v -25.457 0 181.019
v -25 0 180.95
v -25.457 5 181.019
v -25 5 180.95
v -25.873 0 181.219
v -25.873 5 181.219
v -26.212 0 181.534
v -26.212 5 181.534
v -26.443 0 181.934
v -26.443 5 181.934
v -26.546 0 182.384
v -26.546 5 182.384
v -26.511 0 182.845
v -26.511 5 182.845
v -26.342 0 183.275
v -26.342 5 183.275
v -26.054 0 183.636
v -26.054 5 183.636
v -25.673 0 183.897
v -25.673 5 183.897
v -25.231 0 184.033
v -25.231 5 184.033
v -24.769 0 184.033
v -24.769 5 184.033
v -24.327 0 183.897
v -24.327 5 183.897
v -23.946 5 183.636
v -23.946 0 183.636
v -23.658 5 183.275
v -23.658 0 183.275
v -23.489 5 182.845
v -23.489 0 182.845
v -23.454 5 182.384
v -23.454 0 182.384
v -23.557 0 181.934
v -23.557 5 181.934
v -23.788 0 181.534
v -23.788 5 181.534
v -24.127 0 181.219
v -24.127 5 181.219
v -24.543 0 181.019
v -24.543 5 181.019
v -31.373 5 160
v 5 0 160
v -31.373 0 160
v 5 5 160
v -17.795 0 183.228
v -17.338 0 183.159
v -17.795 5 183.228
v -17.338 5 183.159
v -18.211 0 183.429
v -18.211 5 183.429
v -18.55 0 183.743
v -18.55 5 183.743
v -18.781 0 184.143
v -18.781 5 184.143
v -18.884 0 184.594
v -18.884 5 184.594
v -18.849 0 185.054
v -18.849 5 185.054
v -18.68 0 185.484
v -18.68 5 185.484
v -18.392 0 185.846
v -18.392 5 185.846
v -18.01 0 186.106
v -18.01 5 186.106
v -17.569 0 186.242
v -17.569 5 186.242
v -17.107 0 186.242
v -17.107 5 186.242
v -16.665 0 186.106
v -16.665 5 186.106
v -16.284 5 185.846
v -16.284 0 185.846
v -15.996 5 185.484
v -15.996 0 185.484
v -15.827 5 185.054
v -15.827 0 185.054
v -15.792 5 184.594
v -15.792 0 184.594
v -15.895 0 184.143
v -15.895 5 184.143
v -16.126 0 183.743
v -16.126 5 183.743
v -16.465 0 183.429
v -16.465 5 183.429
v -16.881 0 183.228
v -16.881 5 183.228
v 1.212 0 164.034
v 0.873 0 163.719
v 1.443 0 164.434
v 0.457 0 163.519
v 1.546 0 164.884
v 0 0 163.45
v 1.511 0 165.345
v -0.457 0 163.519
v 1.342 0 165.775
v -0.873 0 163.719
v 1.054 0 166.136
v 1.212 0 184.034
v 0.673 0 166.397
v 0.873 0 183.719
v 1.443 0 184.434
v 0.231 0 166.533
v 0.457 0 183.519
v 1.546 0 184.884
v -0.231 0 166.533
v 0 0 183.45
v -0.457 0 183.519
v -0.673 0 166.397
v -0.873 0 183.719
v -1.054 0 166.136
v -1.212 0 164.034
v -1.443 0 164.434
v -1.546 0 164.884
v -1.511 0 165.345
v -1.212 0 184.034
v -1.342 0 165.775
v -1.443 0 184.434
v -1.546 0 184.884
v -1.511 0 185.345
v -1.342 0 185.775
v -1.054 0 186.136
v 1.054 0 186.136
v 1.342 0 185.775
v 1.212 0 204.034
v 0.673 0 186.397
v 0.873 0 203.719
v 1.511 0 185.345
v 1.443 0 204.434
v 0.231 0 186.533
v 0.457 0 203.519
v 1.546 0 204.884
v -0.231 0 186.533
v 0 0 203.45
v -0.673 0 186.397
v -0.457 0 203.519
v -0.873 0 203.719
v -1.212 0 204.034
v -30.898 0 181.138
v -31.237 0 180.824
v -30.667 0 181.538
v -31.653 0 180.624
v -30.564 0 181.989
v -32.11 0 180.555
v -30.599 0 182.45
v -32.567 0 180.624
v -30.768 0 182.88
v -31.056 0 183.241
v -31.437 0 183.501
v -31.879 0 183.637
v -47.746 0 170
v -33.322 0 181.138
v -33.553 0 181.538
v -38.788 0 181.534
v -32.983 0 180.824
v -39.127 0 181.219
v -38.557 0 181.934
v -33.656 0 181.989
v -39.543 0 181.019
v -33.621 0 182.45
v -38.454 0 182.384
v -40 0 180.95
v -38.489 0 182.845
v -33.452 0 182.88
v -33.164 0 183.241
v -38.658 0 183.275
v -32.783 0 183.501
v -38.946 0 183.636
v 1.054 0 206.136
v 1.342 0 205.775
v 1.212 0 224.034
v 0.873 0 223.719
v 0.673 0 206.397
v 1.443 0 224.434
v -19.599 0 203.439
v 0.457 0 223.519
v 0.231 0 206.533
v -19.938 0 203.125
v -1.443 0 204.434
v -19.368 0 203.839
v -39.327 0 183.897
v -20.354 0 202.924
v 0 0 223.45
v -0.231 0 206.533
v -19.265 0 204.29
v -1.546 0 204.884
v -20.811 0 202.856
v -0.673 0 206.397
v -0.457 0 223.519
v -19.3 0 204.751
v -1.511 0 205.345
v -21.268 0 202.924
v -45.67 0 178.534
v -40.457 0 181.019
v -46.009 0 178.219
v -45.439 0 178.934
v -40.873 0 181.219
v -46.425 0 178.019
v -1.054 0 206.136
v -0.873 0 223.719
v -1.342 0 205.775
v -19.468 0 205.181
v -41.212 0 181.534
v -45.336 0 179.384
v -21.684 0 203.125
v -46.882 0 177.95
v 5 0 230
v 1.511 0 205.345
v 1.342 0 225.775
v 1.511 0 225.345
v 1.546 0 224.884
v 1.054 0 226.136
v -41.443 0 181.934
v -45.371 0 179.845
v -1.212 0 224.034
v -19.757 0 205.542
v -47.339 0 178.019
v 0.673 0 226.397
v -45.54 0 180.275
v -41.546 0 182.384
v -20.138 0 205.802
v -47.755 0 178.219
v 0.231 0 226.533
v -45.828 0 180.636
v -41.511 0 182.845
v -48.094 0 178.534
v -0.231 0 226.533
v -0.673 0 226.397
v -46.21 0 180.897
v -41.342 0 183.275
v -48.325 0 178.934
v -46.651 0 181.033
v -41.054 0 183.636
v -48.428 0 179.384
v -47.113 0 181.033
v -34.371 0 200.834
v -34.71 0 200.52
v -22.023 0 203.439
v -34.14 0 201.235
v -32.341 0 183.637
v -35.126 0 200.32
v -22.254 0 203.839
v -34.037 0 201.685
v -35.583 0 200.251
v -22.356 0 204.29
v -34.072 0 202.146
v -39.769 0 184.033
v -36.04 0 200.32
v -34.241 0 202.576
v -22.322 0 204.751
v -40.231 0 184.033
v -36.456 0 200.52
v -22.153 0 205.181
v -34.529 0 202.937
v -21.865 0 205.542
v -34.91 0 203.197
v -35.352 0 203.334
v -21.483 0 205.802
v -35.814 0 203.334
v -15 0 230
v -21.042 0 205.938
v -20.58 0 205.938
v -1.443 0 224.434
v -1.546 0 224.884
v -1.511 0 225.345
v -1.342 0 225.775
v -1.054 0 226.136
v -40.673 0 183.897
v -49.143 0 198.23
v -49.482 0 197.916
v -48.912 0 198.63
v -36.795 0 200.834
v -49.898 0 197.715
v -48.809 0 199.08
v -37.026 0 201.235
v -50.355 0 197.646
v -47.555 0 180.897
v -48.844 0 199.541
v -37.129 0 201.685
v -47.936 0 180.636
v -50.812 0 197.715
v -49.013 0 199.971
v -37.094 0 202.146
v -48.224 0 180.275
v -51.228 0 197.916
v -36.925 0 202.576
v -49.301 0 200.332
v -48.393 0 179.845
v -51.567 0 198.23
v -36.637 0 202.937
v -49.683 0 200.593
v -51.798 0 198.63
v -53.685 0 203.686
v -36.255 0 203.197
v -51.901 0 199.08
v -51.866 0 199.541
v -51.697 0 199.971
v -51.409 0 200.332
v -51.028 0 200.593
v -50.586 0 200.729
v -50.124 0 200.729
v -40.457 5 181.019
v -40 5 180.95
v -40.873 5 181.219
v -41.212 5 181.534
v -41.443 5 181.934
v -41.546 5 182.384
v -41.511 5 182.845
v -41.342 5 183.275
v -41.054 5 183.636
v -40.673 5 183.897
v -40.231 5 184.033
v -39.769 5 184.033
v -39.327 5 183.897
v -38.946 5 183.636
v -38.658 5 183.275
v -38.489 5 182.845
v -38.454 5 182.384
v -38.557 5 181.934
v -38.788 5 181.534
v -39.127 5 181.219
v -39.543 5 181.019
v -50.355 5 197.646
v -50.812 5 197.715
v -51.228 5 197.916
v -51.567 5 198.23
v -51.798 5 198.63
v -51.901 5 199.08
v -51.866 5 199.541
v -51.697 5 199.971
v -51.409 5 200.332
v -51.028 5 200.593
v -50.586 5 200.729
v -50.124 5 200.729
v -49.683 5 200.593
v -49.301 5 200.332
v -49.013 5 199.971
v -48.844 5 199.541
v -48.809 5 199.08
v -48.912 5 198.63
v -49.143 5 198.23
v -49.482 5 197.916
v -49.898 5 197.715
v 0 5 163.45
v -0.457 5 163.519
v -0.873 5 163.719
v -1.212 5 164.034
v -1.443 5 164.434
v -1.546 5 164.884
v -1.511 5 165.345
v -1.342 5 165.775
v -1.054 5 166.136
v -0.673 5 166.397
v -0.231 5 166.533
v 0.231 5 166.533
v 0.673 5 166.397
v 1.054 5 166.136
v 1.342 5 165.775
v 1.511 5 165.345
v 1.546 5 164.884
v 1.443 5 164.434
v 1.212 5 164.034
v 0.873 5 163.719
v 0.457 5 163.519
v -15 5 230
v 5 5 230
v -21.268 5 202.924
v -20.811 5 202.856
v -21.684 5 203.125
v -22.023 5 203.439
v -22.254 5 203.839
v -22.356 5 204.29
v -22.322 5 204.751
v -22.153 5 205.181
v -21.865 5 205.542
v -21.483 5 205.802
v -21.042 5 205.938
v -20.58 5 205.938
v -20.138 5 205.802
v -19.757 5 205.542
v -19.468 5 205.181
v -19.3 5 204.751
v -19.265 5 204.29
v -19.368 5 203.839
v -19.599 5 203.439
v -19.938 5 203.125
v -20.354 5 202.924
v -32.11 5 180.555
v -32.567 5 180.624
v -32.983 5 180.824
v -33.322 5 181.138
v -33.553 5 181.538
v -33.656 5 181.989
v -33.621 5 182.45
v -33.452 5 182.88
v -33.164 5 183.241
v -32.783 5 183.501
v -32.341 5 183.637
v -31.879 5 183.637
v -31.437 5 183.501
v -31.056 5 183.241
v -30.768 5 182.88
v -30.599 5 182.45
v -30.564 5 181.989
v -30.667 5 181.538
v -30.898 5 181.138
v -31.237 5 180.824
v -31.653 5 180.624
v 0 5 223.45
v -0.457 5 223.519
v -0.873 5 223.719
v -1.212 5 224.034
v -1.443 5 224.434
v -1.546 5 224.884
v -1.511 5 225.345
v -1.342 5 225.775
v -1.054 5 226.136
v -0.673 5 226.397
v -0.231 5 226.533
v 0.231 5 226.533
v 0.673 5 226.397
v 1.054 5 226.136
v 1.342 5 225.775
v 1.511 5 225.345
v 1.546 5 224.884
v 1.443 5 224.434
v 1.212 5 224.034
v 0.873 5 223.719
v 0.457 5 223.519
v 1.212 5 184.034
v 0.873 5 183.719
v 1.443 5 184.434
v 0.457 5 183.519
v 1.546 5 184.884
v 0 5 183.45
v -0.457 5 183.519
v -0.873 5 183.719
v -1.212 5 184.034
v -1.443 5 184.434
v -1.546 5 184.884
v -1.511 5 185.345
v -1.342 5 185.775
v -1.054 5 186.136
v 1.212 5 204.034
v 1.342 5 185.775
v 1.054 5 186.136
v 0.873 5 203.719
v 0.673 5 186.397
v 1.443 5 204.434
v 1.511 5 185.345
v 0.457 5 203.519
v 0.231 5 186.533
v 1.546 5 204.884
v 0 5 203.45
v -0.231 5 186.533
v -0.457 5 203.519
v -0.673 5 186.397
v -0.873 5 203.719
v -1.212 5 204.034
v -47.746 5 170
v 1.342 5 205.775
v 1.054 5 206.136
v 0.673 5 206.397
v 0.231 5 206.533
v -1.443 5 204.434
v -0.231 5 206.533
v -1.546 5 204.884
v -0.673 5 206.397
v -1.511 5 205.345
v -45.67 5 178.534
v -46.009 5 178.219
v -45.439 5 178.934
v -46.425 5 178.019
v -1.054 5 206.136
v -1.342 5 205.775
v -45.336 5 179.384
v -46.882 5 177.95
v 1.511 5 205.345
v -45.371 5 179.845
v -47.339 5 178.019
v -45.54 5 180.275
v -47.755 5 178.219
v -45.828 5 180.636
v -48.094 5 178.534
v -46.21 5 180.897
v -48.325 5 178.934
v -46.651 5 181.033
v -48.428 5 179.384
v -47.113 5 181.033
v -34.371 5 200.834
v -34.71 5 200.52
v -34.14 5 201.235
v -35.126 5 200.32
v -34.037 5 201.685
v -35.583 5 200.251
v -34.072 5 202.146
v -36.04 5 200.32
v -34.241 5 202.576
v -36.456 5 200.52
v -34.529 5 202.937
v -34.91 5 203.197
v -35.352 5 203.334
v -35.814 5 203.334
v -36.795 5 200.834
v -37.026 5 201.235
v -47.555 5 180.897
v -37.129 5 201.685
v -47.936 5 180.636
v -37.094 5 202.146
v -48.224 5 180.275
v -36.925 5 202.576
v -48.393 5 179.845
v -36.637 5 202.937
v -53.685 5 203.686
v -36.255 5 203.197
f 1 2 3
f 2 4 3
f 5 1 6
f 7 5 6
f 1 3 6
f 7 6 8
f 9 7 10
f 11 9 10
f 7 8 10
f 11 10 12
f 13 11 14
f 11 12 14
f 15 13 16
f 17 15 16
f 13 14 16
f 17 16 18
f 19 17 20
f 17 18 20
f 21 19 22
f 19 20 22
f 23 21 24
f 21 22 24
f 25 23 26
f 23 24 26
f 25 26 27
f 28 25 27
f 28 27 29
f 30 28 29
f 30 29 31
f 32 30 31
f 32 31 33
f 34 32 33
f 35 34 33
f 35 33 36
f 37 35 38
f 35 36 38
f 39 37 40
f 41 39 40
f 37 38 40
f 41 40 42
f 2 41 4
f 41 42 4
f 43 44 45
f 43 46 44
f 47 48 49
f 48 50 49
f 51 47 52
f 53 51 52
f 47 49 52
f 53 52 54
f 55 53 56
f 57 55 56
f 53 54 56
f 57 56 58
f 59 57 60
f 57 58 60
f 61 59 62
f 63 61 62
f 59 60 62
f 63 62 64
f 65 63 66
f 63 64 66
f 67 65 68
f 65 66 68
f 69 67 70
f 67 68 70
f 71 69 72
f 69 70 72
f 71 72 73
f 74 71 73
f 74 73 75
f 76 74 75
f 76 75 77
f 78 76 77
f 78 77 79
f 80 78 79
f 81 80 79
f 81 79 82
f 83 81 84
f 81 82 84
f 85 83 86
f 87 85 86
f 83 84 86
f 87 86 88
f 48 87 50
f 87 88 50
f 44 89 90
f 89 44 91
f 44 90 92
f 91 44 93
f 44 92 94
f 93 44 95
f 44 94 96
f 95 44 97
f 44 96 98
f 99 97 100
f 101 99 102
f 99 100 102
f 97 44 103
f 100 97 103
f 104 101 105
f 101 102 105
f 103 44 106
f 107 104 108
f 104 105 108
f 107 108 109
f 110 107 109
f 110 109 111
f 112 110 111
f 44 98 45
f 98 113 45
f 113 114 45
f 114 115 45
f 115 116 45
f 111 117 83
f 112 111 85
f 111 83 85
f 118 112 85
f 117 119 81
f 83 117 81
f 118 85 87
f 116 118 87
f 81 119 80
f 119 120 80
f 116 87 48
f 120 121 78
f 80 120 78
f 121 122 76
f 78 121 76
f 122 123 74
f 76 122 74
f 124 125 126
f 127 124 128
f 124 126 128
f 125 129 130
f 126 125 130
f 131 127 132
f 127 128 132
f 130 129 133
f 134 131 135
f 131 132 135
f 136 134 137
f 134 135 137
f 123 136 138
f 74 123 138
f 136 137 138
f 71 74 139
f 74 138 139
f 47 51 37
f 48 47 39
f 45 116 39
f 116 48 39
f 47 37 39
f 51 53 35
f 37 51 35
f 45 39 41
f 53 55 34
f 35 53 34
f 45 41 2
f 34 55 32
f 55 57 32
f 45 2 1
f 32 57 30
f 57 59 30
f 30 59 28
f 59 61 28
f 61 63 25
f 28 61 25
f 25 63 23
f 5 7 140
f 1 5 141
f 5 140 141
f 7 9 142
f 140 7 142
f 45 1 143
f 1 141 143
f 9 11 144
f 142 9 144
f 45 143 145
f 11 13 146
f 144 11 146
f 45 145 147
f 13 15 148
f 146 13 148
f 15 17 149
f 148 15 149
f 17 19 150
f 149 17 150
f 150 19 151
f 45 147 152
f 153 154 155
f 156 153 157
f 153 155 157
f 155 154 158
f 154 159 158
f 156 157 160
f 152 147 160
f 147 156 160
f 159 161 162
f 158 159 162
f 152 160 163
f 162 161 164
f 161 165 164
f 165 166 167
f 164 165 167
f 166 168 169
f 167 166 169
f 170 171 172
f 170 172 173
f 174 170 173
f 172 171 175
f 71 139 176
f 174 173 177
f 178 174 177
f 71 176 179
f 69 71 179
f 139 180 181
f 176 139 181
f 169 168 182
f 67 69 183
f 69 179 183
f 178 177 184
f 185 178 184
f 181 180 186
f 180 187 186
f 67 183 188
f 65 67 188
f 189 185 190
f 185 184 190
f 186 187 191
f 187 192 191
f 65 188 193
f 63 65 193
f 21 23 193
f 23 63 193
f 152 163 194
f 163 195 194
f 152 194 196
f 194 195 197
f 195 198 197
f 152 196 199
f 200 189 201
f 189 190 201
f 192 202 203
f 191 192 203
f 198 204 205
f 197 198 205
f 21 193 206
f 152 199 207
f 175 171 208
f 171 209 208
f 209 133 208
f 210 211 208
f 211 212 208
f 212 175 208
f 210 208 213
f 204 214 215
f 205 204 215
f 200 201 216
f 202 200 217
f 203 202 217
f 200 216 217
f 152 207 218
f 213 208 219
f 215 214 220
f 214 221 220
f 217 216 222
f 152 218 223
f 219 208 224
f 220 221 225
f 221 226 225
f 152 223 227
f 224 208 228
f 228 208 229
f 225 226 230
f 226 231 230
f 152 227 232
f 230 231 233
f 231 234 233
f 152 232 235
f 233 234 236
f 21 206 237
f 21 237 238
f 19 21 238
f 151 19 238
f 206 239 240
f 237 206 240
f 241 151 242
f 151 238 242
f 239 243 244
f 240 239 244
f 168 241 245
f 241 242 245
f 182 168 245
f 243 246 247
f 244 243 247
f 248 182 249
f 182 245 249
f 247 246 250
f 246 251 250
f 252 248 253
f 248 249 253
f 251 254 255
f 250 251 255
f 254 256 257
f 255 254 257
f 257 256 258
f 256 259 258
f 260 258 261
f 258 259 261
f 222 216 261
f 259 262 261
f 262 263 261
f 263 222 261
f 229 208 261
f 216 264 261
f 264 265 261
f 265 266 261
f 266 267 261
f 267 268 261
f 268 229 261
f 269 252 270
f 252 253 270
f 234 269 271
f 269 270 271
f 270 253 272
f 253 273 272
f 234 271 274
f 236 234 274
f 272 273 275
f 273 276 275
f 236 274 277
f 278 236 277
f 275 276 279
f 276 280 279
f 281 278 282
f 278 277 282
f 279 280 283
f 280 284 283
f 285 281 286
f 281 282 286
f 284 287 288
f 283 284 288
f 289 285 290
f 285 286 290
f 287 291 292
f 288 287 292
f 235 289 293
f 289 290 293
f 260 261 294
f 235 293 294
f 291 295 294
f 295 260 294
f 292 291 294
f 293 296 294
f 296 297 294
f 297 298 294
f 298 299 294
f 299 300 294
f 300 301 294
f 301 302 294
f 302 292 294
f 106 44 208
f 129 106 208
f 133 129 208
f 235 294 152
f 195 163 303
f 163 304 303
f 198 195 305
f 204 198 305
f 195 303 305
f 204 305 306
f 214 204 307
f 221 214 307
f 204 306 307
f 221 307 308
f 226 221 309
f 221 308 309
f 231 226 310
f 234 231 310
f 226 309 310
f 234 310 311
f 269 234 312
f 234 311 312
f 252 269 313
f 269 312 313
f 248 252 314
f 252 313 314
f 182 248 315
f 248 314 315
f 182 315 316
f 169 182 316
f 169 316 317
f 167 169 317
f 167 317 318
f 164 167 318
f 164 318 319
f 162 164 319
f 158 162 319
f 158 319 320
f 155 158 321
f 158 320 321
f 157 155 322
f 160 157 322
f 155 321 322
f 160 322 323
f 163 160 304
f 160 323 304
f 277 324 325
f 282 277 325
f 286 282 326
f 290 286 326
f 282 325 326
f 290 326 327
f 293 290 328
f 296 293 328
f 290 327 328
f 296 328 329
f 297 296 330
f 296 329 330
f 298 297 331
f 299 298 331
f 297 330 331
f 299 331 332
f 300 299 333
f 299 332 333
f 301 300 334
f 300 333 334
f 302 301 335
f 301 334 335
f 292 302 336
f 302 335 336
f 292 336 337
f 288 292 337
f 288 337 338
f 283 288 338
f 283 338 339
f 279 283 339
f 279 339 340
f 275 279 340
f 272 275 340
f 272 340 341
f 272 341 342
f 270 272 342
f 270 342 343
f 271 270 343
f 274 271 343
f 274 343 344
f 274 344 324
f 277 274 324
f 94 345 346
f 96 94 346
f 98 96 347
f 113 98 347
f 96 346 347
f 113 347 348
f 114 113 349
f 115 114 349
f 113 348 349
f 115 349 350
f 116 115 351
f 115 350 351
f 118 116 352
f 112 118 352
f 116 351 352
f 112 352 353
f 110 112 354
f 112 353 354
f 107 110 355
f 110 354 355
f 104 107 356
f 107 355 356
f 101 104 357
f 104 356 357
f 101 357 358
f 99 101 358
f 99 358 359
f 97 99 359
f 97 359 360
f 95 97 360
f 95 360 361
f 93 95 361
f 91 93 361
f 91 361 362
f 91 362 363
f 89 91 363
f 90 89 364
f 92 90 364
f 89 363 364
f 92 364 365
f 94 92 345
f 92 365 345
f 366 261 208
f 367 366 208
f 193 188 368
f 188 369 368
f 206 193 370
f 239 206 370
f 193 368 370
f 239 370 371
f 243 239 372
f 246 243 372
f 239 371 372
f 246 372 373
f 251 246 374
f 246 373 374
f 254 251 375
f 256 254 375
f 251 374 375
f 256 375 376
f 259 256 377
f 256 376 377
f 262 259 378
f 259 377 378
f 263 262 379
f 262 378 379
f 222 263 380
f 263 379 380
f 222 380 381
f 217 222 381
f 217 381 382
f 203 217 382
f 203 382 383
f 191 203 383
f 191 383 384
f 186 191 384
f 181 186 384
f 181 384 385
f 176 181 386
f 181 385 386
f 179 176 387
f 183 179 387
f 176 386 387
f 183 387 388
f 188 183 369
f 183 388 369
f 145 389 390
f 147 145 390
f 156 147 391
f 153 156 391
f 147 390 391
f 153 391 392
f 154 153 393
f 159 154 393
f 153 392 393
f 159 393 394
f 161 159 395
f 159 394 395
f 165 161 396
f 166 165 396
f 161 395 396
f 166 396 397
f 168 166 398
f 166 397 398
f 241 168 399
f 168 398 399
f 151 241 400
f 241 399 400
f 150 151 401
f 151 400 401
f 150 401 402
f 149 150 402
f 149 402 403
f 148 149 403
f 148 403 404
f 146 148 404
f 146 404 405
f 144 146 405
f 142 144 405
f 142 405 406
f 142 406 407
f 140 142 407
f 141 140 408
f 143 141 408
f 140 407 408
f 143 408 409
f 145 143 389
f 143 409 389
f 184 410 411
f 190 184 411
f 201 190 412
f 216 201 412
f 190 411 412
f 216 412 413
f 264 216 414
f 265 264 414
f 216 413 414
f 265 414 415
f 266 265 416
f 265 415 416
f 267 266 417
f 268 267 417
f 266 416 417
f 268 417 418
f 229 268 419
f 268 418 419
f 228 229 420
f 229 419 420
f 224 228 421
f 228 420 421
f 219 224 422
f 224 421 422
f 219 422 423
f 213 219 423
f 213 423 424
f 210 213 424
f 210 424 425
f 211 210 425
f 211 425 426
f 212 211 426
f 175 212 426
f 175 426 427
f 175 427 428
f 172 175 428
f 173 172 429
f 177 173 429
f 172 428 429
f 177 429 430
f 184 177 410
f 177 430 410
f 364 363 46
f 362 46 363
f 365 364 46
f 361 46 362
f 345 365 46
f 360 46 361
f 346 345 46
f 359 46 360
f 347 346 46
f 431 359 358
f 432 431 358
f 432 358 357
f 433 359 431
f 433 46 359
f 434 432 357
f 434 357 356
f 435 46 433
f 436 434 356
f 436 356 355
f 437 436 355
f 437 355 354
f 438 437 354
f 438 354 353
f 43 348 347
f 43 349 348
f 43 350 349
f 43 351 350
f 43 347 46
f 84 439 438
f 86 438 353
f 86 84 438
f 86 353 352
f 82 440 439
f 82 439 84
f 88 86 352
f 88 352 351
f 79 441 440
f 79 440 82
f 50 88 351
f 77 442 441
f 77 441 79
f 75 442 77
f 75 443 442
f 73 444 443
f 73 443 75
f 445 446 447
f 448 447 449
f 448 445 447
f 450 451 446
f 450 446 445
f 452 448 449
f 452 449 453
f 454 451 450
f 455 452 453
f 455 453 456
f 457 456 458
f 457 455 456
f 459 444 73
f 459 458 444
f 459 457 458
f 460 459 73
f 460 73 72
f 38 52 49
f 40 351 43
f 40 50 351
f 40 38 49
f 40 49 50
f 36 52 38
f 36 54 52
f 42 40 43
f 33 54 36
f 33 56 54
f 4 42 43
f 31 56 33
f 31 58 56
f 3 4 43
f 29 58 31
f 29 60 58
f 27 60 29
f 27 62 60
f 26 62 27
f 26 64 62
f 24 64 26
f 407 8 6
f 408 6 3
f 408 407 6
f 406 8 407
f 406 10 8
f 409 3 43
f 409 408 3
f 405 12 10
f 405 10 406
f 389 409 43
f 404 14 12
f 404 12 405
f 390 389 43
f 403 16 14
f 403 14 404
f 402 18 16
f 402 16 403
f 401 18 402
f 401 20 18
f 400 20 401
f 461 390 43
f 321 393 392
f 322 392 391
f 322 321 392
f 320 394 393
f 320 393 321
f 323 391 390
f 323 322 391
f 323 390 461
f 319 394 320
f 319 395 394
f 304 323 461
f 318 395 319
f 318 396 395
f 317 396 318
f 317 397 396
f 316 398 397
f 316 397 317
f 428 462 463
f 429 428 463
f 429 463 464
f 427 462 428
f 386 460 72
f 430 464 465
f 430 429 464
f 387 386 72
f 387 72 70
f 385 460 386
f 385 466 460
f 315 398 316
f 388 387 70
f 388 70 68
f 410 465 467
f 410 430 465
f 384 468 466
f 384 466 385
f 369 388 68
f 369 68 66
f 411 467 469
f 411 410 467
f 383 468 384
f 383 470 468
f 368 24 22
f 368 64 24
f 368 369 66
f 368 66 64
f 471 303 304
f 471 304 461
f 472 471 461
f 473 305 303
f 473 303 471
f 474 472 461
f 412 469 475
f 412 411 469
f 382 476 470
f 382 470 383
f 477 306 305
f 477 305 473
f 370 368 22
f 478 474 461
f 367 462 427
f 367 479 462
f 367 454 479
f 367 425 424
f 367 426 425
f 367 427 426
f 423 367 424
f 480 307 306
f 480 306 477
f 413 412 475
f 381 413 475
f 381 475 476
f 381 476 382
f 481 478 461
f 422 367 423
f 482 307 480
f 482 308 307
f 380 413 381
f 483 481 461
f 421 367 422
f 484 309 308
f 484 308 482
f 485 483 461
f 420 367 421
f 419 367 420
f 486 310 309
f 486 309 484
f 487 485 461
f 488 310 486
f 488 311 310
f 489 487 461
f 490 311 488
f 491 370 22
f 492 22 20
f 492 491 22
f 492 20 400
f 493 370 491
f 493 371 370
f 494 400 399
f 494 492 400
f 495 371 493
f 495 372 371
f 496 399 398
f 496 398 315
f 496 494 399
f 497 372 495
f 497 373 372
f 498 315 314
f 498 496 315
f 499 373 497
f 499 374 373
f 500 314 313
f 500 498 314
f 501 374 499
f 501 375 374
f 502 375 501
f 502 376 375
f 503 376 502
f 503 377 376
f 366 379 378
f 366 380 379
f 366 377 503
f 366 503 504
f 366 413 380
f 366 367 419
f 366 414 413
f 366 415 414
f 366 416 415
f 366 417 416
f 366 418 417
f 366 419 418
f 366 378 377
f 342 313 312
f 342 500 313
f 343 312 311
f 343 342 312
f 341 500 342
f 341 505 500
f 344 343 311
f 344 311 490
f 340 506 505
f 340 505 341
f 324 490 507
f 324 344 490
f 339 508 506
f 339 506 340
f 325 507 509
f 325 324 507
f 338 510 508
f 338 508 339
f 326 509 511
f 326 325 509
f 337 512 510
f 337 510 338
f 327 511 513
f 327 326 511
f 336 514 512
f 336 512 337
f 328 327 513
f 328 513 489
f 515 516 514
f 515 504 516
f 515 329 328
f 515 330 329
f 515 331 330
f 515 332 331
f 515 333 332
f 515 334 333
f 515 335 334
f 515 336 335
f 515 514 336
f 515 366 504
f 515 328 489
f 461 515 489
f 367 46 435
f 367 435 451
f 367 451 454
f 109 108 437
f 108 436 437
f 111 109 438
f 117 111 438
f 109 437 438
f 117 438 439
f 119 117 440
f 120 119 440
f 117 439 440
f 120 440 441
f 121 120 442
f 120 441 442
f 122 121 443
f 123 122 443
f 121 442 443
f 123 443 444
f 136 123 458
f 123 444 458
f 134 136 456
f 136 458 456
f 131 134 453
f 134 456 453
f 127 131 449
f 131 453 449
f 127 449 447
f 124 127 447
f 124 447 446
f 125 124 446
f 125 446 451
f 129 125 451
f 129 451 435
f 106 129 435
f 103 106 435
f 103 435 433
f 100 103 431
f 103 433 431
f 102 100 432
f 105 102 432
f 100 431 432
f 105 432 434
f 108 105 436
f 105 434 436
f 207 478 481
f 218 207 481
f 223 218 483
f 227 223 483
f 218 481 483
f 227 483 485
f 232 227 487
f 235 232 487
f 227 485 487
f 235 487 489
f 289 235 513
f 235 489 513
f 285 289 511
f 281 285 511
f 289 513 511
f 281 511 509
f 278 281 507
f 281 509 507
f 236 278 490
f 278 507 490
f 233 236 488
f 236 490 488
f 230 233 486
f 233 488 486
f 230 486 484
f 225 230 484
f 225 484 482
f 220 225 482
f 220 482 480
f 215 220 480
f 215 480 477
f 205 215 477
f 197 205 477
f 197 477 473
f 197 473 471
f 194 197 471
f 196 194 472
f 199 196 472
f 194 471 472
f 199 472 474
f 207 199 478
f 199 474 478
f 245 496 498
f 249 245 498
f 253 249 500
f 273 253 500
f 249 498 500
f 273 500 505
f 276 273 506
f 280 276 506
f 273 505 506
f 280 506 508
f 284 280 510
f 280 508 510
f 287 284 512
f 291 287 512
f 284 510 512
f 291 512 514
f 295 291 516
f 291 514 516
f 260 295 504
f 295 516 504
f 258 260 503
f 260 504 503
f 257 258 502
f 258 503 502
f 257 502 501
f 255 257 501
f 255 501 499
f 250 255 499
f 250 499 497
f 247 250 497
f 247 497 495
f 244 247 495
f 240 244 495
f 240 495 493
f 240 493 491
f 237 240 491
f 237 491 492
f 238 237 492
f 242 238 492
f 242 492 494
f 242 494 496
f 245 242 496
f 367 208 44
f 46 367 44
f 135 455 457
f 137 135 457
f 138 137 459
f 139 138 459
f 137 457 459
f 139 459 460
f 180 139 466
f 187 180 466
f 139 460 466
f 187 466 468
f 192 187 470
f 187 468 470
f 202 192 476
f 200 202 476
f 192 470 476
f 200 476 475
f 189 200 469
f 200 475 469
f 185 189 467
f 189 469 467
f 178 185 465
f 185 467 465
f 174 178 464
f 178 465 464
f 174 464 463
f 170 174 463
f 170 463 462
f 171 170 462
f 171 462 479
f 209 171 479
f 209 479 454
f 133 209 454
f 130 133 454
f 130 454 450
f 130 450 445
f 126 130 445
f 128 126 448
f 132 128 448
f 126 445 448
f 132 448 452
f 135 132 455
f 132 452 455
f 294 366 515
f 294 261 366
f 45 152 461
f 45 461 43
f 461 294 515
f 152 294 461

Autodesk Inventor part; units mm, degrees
ref_plane "YZ Plane" through (0, 0, 0) normal (1, 0, 0) x (0, 1, 0)
ref_plane "XZ Plane" through (0, 0, 0) normal (0, 1, 0) x (-1, 0, 0)
ref_plane "XY Plane" through (0, 0, 0) normal (0, 0, 1) x (1, 0, 0)
sketch "スケッチ1" plane through (0, 0, 0) normal (0, 1, 0) x (-1, 0, 0)
  circle A0 centre (0, 0) radius 122.5
  line L0 (0, 0) -> (21.2719, 120.6389)
  line L1 (21.2719, 120.6389) -> (-21.2719, -120.6389)
  line L2 (21.2719, 120.6389) -> (-41.166, -233.4643)
  arc A1 (21.2719, 120.6389) -> (0, 122.5) centre (0, 0) ccw
  arc A2 (-21.2719, -120.6389) -> (0, -122.5) centre (0, 0) ccw
  arc A3 (-41.8975, -115.1123) -> (-21.2719, -120.6389) centre (0, 0) ccw
  circle A4 centre (0, 0) radius 125
  circle A5 centre (0, 0) radius 145
  arc A6 (-42.7525, -117.4616) -> (-105.9051, -66.4011) centre (0, 0) ccw
  line L3 (0, 0) -> (-42.7525, -117.4616) construction
  line L4 (21.706, 123.101) -> (21.706, 123.101)
  line L5 (0, -145) -> (0, -265.735)
  line L6 (0, 0) -> (-41.8975, -115.1123)
  line L7 (-49.5929, -136.2554) -> (-41.8975, -115.1123)
  line L8 (-42.7525, -117.4616) -> (-231.4975, -48.764)
  line L9 (42.7525, 117.4616) -> (0, 0)
  line L10 (0, -145) -> (0, 145)
  line L11 (0, 0) -> (0, 300)
  circle A7 centre (0, 300) radius 20
  line L12 (117.0937, 43.75) -> (18.735, 307)
  line L13 (0, 0) -> (185.4327, 0)
  line L14 (0, 0) -> (-259.4726, 94.4403)
  line L15 (42.7525, 117.4616) -> (-253.7236, 225.3701)
  line L16 (0, 125) -> (22.0409, 125)
  line L17 (21.2719, 120.6389) -> (25.179, 142.7971)
  line L18 (42.7525, 117.4616) -> (65.8461, 180.9106)
  line L19 (15, 170) -> (69.9226, 170)
  line L20 (15.9946, 175) -> (68.0545, 175)
  line L21 (0, 125) -> (-15, 125)
  line L22 (-15, 125) -> (-15, 325)
  line L23 (-15, 325) -> (0, 325)
  line L24 (0, 325) -> (0, 125)
  line L25 (0, 125) -> (15, 125)
  line L26 (15, 125) -> (15, 325)
  line L27 (15, 325) -> (0, 325)
  line L28 (0, 325) -> (0, 125)
  line L29 (15, 200) -> (15, 325)
  line L30 (15, 325) -> (-15, 325)
  line L31 (-15, 325) -> (-15, 150)
  line L32 (15, 170) -> (37.5, 170)
  line L33 (37.5, 170) -> (17.5, 170)
  line L34 (0, 0) -> (0, 300)
  line L35 (0, -125) -> (42.7525, 117.4616)
  line L36 (-42.7525, -117.4616) -> (0, 125)
  line L37 (0, -125) -> (-3.519, -144.9573)
  line L38 (42.7525, 117.4616) -> (49.5929, 136.2554)
  line L39 (0, 125) -> (3.519, 144.9573)
  line L40 (-42.7525, -117.4616) -> (-46.2715, -137.4189)
  line L41 (42.7525, 117.4616) -> (46.2715, 137.4189)
  line L42 (-3.519, -144.9573) -> (46.2715, 137.4189)
  line L43 (46.2715, 137.4189) -> (37.2054, 139.0175)
  line L44 (-12.5852, -143.3587) -> (-3.519, -144.9573)
  line L45 (-46.2715, -137.4189) -> (3.519, 144.9573)
  line L46 (3.519, 144.9573) -> (12.5852, 143.3587)
  line L47 (-37.2054, -139.0175) -> (-46.2715, -137.4189)
  line L48 (-27.6373, -142.3418) -> (-22.7132, -143.21)
  line L49 (-27.6373, -142.3418) -> (-22.7132, -143.21)
  line L50 (-22.7132, -143.21) -> (27.641, 142.363)
  line L51 (27.641, 142.363) -> (22.717, 143.2312)
  line L52 (22.717, 143.2312) -> (-27.6373, -142.3418)
  line L53 (12.5852, 143.3587) -> (-37.2054, -139.0175)
  line L54 (-12.5852, -143.3587) -> (37.2054, 139.0175)
  line L55 (-42.1294, -138.1492) -> (7.6611, 144.2269)
  line L56 (-7.6611, -144.2269) -> (42.1294, 138.1492)
  line L57 (12.5852, 143.3587) -> (7.6611, 144.2269)
  line L58 (7.6611, 144.2269) -> (29.236, 266.5842)
  line L59 (29.236, 266.5842) -> (34.1601, 265.7159)
  line L60 (34.1601, 265.7159) -> (12.5852, 143.3587)
  line L61 (22.717, 143.2312) -> (25.179, 142.7971)
  line L62 (25.179, 142.7971) -> (42.462, 240.8141)
  line L63 (42.462, 240.8141) -> (40, 241.2482)
  line L64 (40, 241.2482) -> (22.717, 143.2312)
  line L65 (42.1294, 138.1492) -> (37.2054, 139.0175)
  line L66 (37.2054, 139.0175) -> (49.9319, 211.1932)
  line L67 (49.9319, 211.1932) -> (54.8559, 210.3249)
  line L68 (54.8559, 210.3249) -> (42.1294, 138.1492)
  line L69 (25.179, 142.7971) -> (27.641, 142.363)
  line L70 (27.641, 142.363) -> (44.508, 238.0204)
  line L71 (44.508, 238.0204) -> (42.046, 238.4546)
  line L72 (42.046, 238.4546) -> (25.179, 142.7971)
  line L73 (15.9946, 175) -> (15, 175)
  line L74 (15, 175) -> (0, 175)
  line L75 (0, 175) -> (0, 170)
  line L76 (0, 170) -> (15, 170)
  line L77 (15, 170) -> (15, 175)
  line L78 (20, 175) -> (40, 175)
  line L79 (40, 175) -> (40, 245)
  line L80 (40, 245) -> (20, 245)
  line L81 (20, 245) -> (20, 175)
  line L82 (30, 175) -> (30, 118.7697)
  line L83 (0, 175) -> (58.7137, 175)
  line L84 (58.7137, 175) -> (58.7137, 200)
  line L85 (58.7137, 200) -> (0, 200)
  line L86 (0, 200) -> (0, 175)
  line L87 (0, 200) -> (50, 200)
  line L88 (50, 200) -> (50, 170)
  line L89 (50, 170) -> (0, 170)
  line L90 (0, 170) -> (0, 200)
  line L91 (50, 170) -> (0, 170)
  line L92 (0, 170) -> (0, 165)
  line L93 (0, 200) -> (-15, 200)
  line L94 (-15, 200) -> (-15, 180)
  line L95 (-15, 180) -> (0, 180)
  line L96 (0, 180) -> (0, 200)
  line L97 (0, 180) -> (-15, 180)
  line L98 (-15, 180) -> (-15, 175)
  line L99 (-15, 175) -> (0, 175)
  line L100 (0, 175) -> (0, 180)
  line L101 (0, 145) -> (-15, 145)
  line L102 (-15, 145) -> (-20.5, 145)
  line L103 (-20.5, 145) -> (-20.5, 200)
  line L104 (-20.5, 200) -> (-15, 200)
  line L105 (-15, 200) -> (-15, 145)
  line L106 (-20.5, 150) -> (-25, 150)
  line L107 (-25, 150) -> (-25, 180)
  line L108 (-25, 180) -> (-20.5, 180)
  line L109 (-20.5, 180) -> (-20.5, 150)
  line L110 (50, 175) -> (-15, 175)
  line L111 (-15, 175) -> (-15, 170)
  line L112 (50, 170) -> (50, 175)
  line L113 (-20.5, 165) -> (-25, 165)
  line L114 (-25, 165) -> (-25, 195)
  line L115 (-25, 195) -> (-20.5, 195)
  line L116 (-20.5, 195) -> (-20.5, 165)
  line L117 (15, 230) -> (-15, 230)
  line L118 (-15, 145) -> (15, 145)
  line L119 (31.698, 266.1501) -> (-39.6674, -138.5834)
  line L120 (52.3939, 210.7591) -> (-10.1232, -143.7928)
  line L121 (49.3441, 179.0659) -> (14.8758, 185.1436)
  line L122 (-15, 138.4818) -> (-15, 121.5782)
  line L123 (-7.6611, -144.2269) -> (-42.1294, -138.1492)
  line L124 (-39.6243, -123.9424) -> (-5.1561, -130.02)
  line L125 (-42.2291, -138.7145) -> (-7.7608, -144.7922)
  line L126 (-41.3608, -133.7904) -> (-6.8926, -139.8681)
  line L127 (-6.0243, -134.9441) -> (-40.4926, -128.8664)
  line L128 (18.3488, 204.8397) -> (52.8171, 198.762)
  line L129 (50.2124, 183.9899) -> (45.0029, 154.4457)
  line L130 (10.5346, 160.5234) -> (15.7441, 190.0676)
  line L131 (19.217, 209.7638) -> (53.6853, 203.6861)
  line L132 (15, 230) -> (53.6853, 203.6861)
  line L133 (53.6853, 203.6861) -> (53.6853, 170)
  line L134 (53.6853, 170) -> (-15, 170)
  line L135 (-15, 172.5) -> (53.6853, 172.5)
  line L136 (15, 170) -> (15, 150)
  line L137 (15, 150) -> (-15, 150)
  line L138 (-15, 170) -> (15, 170)
  line L139 (15, 150) -> (-15, 150)
  line L140 (-15, 150) -> (-15, 325)
  line L141 (-15, 325) -> (15, 325)
  line L142 (15, 325) -> (15, 150)
  circle A8 centre (0, 300) radius 6
  circle A9 centre (0, 300) radius 11
  line L143 (47.7456, 170) -> (15, 150)
  point P0 (-25.1752, -142.7759)
  point P1 (42.3116, 114.9608)
  point P2 (0, 133.0222)
  point P3 (-38.8988, -134.2246)
  point P4 (-38.0306, -129.3005)
  point P5 (-23.2585, -131.9052)
  point P6 (-24.1267, -136.8293)
  point P7 (-9.3546, -139.434)
  point P8 (-8.4863, -134.51)
  point P9 (17.3379, 184.7094)
  point P10 (32.11, 182.1047)
  point P11 (46.8821, 179.5)
  point P12 (50.3551, 199.1962)
  point P13 (35.5829, 201.8009)
  point P14 (20.8108, 204.4056)
  point P15 (0, 225)
  point P16 (0, 190)
  point P17 (0, 289)
  point P18 (0, 311)
  point P19 (37.5, 172.5)
  point P20 (22.5, 172.5)
  point P21 (47.7456, 170)
  point P22 (-15, 230)
  point P23 (20, 185.4103)
  point P24 (20, 184.24)
  point P25 (19.7999, 184.2753)
  point P26 (30, 170.1385)
  point P27 (30, 170)
  point P28 (29.9756, 170)
  point P29 (15, 185.8477)
  point P30 (15, 185.1217)
  dimension "d0" = 245
  dimension "d7" = 290
  dimension "d19" = 40
  dimension "d1" = 0
  dimension "d6" = 250
  dimension "d10" = 0
  dimension "d12" = 0
  dimension "d13" = 10
  dimension "d15" = 0
  dimension "d16" = 9.8877
  dimension "d18" = 10
  dimension "d21" = 145
  dimension "d23" = 175
  dimension "d26" = 7.5384
  dimension "d30" = 180
  dimension "d34" = 180
  dimension "d35" = 45
  dimension "d37" = 5
  dimension "d38" = 15
  dimension "d39" = 200
  dimension "d40" = 15
  dimension "d41" = 200
  dimension "d47" = 300
  dimension "d52" = 5
  dimension "d53" = 0
  dimension "d54" = 10
  dimension "d55" = 10
  dimension "d56" = 5
  dimension "d57" = 5
  dimension "d60" = 5
  dimension "d61" = 20
  dimension "d62" = 70
  dimension "d63" = 5
  dimension "d65" = 25
  dimension "d66" = 50
  dimension "d68" = 20
  dimension "d69" = 5
  dimension "d74" = 20
  dimension "d75" = 5.5
  dimension "d76" = 55
  dimension "d77" = 4.5
  dimension "d78" = 30
  dimension "d79" = 5
  dimension "d82" = 15
  dimension "d83" = 30
  dimension "d89" = 10.5222
  dimension "d92" = 15
  dimension "d93" = 5
  dimension "d94" = 5
  dimension "d96" = 4.5
  dimension "d97" = 5
  dimension "d98" = 30
  dimension "d99" = 5
  dimension "d101" = 20
  dimension "d102" = 10
  dimension "d103" = 20
  dimension "d104" = 12
  dimension "d105" = 22
  dimension "d106" = 7.5
  dimension "d107" = 15
  dimension "d108" = 30
extrude "押し出し1" add sketch "スケッチ1" along normal blind 5 contours L143 L66 L19 L120 | L120 L19 L143 | L19 L120 L135 L68 | L143 L70 L19 L66 | L19 L66 L135 L120 | L135 L120 L20 L68 | L19 L70 L135 L66 | L143 L82 L19 L70 | L135 L66 L20 L120 | L20 L120 L121 L68 | L143 L62 L19 L82 | L68 L85 L120 L131 | L131 L120 L132 | L68 L128 L120 L85 | L88 L120 L128 L68 | L68 L121 L120 L88 | L135 L70 L20 L66 | L19 L82 L62 L135 L70 | L20 L66 L121 L120 | L143 L64 L19 L62 | L19 L62 L82 | L132 L66 L131 L79 L70 | L70 L79 L132 | L120 L131 L66 L132 | L120 L85 L66 L131 | L120 L128 L88 L85 | L120 L121 L66 L128 L88 | L88 L128 L120 | L20 L79 L121 L66 | L135 L62 L20 L70 | L143 L26 L60 L19 L64 | L19 L64 L135 L82 L62 | L82 L135 L62 | L79 L131 L70 | L70 L131 L62 L132 L79 | L66 L85 L128 L79 L131 | L88 L128 L66 L85 | L20 L70 L121 L79 | L121 L79 L85 L128 L66 | L20 L62 L121 L70 | L135 L82 L20 L62 | L19 L60 L135 L64 | L137 L60 L26 | L135 L64 L20 L82 | L132 L64 L131 L60 | L60 L131 L119 L132 | L131 L79 L128 L70 | L70 L128 L62 L131 | L62 L131 L64 L132 | L66 L128 L85 | L121 L70 L85 L79 | L20 L64 L121 L62 | L121 L62 L85 L70 | L135 L60 L20 L64 | L60 L137 L119 L76 L26 | L26 L19 L60 | L119 L131 L81 L58 L132 | L131 L64 L128 L60 | L60 L128 L119 L131 | L128 L79 L85 L70 | L70 L85 L62 L128 | L62 L128 L64 L131 | L128 L85 L79 | L121 L64 L85 L62 | L19 L26 L119 L135 L60 | L20 L81 L121 L64 | L135 L119 L73 L20 L60 | L76 L119 L26 | L137 L58 L76 L119 | L132 L81 L58 L85 L26 | L26 L85 L11 L117 | L58 L81 L132 | L119 L128 L81 L131 | L128 L64 L85 L60 | L60 L85 L119 L128 | L62 L85 L64 L128 | L121 L81 L60 L85 L64 | L20 L60 L121 L81 | L20 L73 L119 L121 L60 | L135 L26 L73 L119 | L119 L26 L135 | L119 L76 L58 L135 L26 | L137 L11 L76 L58 | L11 L93 L22 L117 | L85 L58 L26 | L26 L58 L74 L11 L85 | L81 L131 L58 | L119 L85 L81 L128 | L81 L128 L58 L131 | L60 L81 L119 L85 | L121 L60 L81 | L137 L22 L134 L11 | L121 L119 L81 L60 | L73 L26 L121 L119 | L135 L58 L74 L26 | L76 L11 L135 L58 | L11 L95 L22 L93 | L58 L85 L81 L119 L121 L26 | L26 L121 L58 | L58 L128 L81 L85 | L119 L81 L85 | L74 L58 L121 L26 | L135 L11 L74 L58 | L134 L22 L135 L11 | L11 L99 L22 L95 | L135 L22 L99 L11
hole "穴1" at (0, 0, -125) at (-42.3116, 0, 114.9608) at (0, 0, 133.0222) at (0, 0, 122.5) at (38.8988, 0, -134.2246) at (38.0306, 0, -129.3005) at (23.2585, 0, -131.9052) at (24.1267, 0, -136.8293) at (9.3546, 0, -139.434) at (8.4863, 0, -134.51) at (-17.3379, 0, 184.7094) at (-32.11, 0, 182.1047) at (-46.8821, 0, 179.5) at (-50.3551, 0, 199.1962) at (-35.5829, 0, 201.8009) at (-20.8108, 0, 204.4056) at (0, 0, 225) at (0, 0, 289) at (0, 0, 300) at (0, 0, 311) direction (0, 1, 0) diameter 3.1 end through all
sketch "スケッチ3" plane through (0, 0, 0) normal (0, -1, 0) x (1, 0, 0)
  line L0 (0, 0) -> (0, 300) projected
  line L1 (15, 150) -> (-15, 150) projected
  line L2 (-5, 150) -> (-5, 230)
  line L3 (-15, 230) -> (15, 230) projected
  point P0 (0, 0)
  point P1 (0, 165)
  point P2 (0, 165)
  point P3 (0, 185)
  point P4 (0, 205)
  point P5 (-5, 165.0635)
  point P6 (-5, 185.0635)
  point P7 (-5, 205)
  dimension "d118" = 15
  dimension "d136" = 20
  dimension "d138" = 20
  dimension "d139" = 10
  dimension "d140" = 20
hole "穴2" at (0, 0, 165) at (0, 0, 185) at (0, 0, 205) direction (0, 1, 0) diameter 3.1 end through all
sketch "スケッチ4" plane through (0, 0, 0) normal (0, -1, 0) x (1, 0, 0)
  line L0 (-15, 230) -> (15, 230) projected
  line L1 (5, 230) -> (5, 150)
  line L2 (15, 150) -> (-15, 150) projected
  line L3 (15, 230) -> (15, 150) projected
  circle A0 centre (0, 165) radius 1.55 projected
  circle A1 centre (0, 225) radius 1.55 projected
  circle A2 centre (-20.8108, 204.4056) radius 1.55 projected
  circle A3 centre (-35.5829, 201.8009) radius 1.55 projected
  circle A4 centre (-50.3551, 199.1962) radius 1.55 projected
  circle A5 centre (-46.8821, 179.5) radius 1.55 projected
  circle A6 centre (-32.11, 182.1047) radius 1.55 projected
  circle A7 centre (-17.3379, 184.7094) radius 1.55 projected
  line L4 (15, 150) -> (-15, 150) projected
  line L5 (15, 230) -> (15, 150) projected
  line L6 (-15, 230) -> (15, 230) projected
  line L7 (-53.6853, 203.6861) -> (-15, 230) projected
  line L8 (-47.7456, 170) -> (-53.6853, 203.6861) projected
  line L9 (-15, 150) -> (-47.7456, 170) projected
  point P0 (0, 0)
  dimension "d133" = 10
extrude "押し出し2" cut sketch "スケッチ4" against normal blind 5 contours L0 L3 L2 L1
sketch "スケッチ6" plane through (0, 0, 0) normal (0, -1, 0) x (1, 0, 0)
  line L0 (5, 150) -> (5, 230) projected
  line L1 (5, 182.5) -> (-49.9496, 182.5)
  line L2 (-47.7456, 170) -> (-53.6853, 203.6861) projected
  line L3 (15, 172.5) -> (-53.6853, 172.5) projected
  line L4 (5, 150) -> (5, 230) projected
  line L5 (-15, 230) -> (5, 230) projected
  line L6 (-53.6853, 203.6861) -> (-15, 230) projected
  line L7 (-47.7456, 170) -> (-53.6853, 203.6861) projected
  line L8 (-15, 150) -> (-47.7456, 170) projected
  line L9 (5, 150) -> (-15, 150) projected
  circle A0 centre (-17.3379, 184.7094) radius 1.55 projected
  circle A1 centre (-32.11, 182.1047) radius 1.55 projected
  circle A2 centre (-46.8821, 179.5) radius 1.55 projected
  circle A3 centre (-50.3551, 199.1962) radius 1.55 projected
  circle A4 centre (-35.5829, 201.8009) radius 1.55 projected
  circle A5 centre (-20.8108, 204.4056) radius 1.55 projected
  circle A6 centre (0, 225) radius 1.55 projected
  circle A7 centre (0, 165) radius 1.55 projected
  circle A8 centre (0, 185) radius 1.55 projected
  circle A9 centre (0, 205) radius 1.55 projected
  line L10 (-15, 125) -> (-15, 325) projected
  point P0 (0, 0)
  point P1 (-40, 182.5)
  point P2 (-25, 182.5)
  dimension "d142" = 20
  dimension "d143" = 15
  dimension "d144" = 10
hole "穴4" at (-25, 0, 182.5) at (-40, 0, 182.5) direction (0, 1, 0) diameter 3.1 end through all
sketch "スケッチ7" plane through (0, 5, 0) normal (0, 1, 0) x (1, 0, 0)
  circle A0 centre (-40, -182.5) radius 1.55 projected
  circle A1 centre (-25, -182.5) radius 1.55 projected
  line L0 (5, -230) -> (5, -150) projected
  line L1 (5, -150) -> (-15, -150) projected
  line L2 (-15, -150) -> (-47.7456, -170) projected
  line L3 (-47.7456, -170) -> (-53.6853, -203.6861) projected
  line L4 (-53.6853, -203.6861) -> (-15, -230) projected
  line L5 (-15, -230) -> (5, -230) projected
  circle A2 centre (0, -205) radius 1.55 projected
  circle A3 centre (0, -185) radius 1.55 projected
  circle A4 centre (0, -165) radius 1.55 projected
  circle A5 centre (0, -225) radius 1.55 projected
  circle A6 centre (-20.8108, -204.4056) radius 1.55 projected
  circle A7 centre (-35.5829, -201.8009) radius 1.55 projected
  circle A8 centre (-50.3551, -199.1962) radius 1.55 projected
  circle A9 centre (-46.8821, -179.5) radius 1.55 projected
  circle A10 centre (-32.11, -182.1047) radius 1.55 projected
  circle A11 centre (-17.3379, -184.7094) radius 1.55 projected
  line L6 (5, -160) -> (-31.3728, -160)
  line L7 (-15, -150) -> (-47.7456, -170) projected
  point P0 (0, 0)
  dimension "d152" = 10
extrude "押し出し3" cut sketch "スケッチ7" against normal blind 5 contours L6 L2 L1 L0
equation "\"d18\" = d13"
properties part number "hand2_04" material "アルミニウム 6061-AHC"
